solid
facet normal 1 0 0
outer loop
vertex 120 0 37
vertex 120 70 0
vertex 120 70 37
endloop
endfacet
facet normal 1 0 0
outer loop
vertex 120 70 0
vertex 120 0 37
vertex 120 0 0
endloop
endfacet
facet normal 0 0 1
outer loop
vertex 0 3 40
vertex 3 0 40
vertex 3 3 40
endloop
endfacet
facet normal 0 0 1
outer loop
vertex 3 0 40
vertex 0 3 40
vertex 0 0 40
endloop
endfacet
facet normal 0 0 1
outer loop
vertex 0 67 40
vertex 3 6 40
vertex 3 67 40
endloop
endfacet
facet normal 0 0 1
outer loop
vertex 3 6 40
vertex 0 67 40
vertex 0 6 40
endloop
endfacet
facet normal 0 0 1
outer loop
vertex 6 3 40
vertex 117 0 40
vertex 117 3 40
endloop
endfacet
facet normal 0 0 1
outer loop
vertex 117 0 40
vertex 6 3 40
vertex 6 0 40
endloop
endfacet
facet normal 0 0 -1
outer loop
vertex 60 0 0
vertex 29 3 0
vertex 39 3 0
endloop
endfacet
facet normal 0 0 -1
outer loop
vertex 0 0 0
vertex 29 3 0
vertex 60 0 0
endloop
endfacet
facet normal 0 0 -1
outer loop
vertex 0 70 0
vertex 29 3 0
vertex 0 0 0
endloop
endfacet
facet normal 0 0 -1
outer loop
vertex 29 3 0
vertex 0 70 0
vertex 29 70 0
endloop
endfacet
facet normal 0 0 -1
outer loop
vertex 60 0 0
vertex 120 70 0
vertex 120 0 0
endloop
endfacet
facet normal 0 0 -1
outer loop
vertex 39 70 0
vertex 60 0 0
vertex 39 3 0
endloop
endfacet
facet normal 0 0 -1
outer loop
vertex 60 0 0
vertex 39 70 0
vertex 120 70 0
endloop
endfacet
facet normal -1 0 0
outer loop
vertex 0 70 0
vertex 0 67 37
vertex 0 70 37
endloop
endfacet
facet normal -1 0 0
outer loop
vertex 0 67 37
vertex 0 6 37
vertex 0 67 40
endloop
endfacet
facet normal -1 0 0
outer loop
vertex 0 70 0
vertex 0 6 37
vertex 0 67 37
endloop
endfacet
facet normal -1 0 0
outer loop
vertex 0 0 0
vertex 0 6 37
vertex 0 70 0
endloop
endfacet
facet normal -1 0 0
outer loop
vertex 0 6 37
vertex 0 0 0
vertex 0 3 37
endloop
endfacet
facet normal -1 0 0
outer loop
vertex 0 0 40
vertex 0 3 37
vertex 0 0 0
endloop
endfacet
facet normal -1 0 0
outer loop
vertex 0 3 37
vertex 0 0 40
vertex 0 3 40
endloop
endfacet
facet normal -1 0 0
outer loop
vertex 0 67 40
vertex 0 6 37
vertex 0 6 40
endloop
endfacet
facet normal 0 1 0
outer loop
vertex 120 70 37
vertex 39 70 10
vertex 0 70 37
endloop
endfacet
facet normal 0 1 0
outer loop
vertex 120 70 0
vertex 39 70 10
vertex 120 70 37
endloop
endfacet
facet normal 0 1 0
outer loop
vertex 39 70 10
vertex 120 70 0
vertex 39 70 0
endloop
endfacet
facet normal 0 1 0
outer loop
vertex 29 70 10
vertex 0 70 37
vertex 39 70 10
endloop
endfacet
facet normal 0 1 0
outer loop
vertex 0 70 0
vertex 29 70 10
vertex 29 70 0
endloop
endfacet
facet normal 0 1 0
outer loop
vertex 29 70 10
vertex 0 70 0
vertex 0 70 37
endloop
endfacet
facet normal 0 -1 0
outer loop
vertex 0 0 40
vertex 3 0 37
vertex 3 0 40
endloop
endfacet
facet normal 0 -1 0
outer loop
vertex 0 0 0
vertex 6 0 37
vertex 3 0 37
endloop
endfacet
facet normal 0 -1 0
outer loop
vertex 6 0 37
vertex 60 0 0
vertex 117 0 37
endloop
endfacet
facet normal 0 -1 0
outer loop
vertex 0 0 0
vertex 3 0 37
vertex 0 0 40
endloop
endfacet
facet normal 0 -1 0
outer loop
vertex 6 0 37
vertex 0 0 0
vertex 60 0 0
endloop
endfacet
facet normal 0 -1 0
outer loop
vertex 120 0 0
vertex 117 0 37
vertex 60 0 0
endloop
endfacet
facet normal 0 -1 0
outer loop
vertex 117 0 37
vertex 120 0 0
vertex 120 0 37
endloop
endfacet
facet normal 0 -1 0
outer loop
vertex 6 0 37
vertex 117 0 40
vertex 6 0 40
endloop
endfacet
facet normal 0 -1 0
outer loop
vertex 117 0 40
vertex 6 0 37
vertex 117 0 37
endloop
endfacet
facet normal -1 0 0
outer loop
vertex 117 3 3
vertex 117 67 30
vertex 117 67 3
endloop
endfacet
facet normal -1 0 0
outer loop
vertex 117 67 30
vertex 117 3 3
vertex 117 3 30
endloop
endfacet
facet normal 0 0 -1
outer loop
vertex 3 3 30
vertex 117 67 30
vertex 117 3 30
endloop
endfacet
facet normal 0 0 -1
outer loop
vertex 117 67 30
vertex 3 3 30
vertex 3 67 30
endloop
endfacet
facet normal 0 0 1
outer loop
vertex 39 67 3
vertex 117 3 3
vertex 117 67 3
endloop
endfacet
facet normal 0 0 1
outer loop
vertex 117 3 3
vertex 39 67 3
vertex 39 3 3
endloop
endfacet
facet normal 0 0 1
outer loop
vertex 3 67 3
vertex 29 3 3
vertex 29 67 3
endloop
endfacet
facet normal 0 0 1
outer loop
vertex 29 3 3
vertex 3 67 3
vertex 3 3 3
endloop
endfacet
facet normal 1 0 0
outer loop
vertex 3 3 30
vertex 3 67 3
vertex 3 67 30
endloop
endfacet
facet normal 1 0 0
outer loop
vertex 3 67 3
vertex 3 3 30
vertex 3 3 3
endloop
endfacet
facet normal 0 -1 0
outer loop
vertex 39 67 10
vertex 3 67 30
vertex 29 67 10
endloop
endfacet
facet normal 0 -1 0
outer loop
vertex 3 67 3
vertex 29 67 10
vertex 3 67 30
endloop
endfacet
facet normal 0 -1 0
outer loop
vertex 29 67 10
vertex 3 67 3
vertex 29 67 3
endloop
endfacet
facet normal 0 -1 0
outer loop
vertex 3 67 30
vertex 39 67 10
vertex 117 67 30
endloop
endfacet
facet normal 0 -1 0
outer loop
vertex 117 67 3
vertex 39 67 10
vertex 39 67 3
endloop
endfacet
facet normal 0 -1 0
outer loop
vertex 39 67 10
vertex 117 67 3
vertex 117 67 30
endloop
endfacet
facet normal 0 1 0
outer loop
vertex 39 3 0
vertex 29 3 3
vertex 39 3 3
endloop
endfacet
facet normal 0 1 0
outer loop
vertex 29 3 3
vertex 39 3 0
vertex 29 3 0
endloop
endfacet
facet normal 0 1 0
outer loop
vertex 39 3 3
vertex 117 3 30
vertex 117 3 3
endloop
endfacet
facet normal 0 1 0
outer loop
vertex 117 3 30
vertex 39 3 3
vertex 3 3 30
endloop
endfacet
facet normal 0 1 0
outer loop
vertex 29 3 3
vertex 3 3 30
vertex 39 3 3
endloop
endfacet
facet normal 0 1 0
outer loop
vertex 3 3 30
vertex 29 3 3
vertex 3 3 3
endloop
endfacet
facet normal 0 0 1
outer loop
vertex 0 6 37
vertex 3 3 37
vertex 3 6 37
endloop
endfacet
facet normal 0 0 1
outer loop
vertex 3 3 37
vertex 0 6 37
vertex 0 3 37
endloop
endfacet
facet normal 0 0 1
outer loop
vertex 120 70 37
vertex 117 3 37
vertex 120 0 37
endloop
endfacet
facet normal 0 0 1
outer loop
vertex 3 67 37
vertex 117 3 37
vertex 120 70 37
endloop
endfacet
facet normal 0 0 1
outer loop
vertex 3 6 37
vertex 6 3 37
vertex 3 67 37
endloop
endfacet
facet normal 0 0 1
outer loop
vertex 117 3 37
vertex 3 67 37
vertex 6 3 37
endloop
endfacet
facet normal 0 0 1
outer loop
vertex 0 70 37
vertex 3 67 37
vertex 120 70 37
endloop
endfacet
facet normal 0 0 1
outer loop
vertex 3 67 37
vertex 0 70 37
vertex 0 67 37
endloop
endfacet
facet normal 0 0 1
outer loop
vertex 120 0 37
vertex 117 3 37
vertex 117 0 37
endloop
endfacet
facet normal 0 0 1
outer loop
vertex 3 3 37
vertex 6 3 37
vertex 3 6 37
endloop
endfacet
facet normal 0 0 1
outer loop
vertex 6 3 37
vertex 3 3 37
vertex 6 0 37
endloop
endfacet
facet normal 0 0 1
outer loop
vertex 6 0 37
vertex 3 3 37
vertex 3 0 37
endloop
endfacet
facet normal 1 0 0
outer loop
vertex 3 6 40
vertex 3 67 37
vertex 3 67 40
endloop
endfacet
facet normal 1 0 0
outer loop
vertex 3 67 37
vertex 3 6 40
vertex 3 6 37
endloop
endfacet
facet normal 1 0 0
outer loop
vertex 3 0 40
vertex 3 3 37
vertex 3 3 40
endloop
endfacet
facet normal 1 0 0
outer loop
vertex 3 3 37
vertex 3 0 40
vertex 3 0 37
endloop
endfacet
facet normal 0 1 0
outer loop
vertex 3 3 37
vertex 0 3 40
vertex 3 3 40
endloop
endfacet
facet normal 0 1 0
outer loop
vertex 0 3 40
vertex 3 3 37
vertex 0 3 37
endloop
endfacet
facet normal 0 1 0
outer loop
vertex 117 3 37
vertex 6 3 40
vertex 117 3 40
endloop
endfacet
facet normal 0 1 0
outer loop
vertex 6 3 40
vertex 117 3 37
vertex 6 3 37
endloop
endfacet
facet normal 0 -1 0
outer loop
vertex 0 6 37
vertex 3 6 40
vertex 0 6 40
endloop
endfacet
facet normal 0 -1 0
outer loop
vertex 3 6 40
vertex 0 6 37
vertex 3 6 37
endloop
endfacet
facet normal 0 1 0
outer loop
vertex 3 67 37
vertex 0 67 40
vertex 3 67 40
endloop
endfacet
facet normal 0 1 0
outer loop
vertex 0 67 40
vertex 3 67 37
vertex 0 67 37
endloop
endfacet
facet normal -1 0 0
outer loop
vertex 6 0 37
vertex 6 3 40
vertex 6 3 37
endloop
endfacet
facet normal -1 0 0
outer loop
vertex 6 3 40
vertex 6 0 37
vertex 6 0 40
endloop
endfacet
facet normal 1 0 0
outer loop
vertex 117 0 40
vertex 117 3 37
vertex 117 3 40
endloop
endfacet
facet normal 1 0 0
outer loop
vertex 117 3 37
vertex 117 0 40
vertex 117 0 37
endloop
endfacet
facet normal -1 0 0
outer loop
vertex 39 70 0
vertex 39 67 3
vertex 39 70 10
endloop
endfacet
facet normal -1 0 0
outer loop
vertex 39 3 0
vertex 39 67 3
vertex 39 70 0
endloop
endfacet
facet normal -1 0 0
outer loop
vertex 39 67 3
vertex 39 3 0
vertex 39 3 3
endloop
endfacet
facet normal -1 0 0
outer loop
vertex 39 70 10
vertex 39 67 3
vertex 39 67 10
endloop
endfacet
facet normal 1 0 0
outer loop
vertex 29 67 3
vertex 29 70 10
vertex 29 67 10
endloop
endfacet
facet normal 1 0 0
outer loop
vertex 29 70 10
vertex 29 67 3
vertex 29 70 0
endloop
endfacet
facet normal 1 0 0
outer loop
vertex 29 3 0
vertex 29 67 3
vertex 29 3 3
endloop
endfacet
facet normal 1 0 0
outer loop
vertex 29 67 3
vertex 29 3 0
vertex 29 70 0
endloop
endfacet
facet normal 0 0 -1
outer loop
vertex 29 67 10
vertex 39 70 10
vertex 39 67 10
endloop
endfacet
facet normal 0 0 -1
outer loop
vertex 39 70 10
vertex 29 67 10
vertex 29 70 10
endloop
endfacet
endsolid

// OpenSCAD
// Buffer tank for a mini horizontal gel-electrophoresis box. Open-top rectangular tank with a
// solid raised platform in the middle that divides the bottom into two buffer chambers. Each end
// wall has a horizontal 2 mm hole for an electrode wire. NOVEL general part.
//

L     = 120;
W     = 70;
H     = 40;
wall  = 3;
floor = 3;
plat_X = 60;
plat_z = 10;

$fn = 64;

inner_H = H - wall;
inner_W = W - 2 * wall;
inner_L = L - 2 * wall;

difference() {
    cube([L, W, H]);
    translate([wall, wall, wall]) cube([inner_L, inner_W, inner_H - plat_z]);   // bottom, open at top
    translate([wall, wall, H - wall]) cube([L, W, wall]);                        // top edge ring
    translate([0, wall, H - wall]) cube([L, wall, wall]);                        // front wall
    translate([0, W - wall, H - wall]) cube([L, wall, wall]);                    // back wall
    translate([wall, 0, H - wall]) cube([wall, W, wall]);                        // left wall
    translate([L - wall, 0, H - wall]) cube([wall, W, wall]);                    // right wall
    translate([plat_X / 2 - 1, wall, plat_z]) rotate([0, 90, 0]) cube([plat_X, W, plat_z]);  // central platform (horizontal)
    for (x = [-L / 2, L / 2])
        translate([x, 0, -1]) rotate([-90, 0, 0]) cylinder(h = H + 2, d = 2);   // electrode holes
}
